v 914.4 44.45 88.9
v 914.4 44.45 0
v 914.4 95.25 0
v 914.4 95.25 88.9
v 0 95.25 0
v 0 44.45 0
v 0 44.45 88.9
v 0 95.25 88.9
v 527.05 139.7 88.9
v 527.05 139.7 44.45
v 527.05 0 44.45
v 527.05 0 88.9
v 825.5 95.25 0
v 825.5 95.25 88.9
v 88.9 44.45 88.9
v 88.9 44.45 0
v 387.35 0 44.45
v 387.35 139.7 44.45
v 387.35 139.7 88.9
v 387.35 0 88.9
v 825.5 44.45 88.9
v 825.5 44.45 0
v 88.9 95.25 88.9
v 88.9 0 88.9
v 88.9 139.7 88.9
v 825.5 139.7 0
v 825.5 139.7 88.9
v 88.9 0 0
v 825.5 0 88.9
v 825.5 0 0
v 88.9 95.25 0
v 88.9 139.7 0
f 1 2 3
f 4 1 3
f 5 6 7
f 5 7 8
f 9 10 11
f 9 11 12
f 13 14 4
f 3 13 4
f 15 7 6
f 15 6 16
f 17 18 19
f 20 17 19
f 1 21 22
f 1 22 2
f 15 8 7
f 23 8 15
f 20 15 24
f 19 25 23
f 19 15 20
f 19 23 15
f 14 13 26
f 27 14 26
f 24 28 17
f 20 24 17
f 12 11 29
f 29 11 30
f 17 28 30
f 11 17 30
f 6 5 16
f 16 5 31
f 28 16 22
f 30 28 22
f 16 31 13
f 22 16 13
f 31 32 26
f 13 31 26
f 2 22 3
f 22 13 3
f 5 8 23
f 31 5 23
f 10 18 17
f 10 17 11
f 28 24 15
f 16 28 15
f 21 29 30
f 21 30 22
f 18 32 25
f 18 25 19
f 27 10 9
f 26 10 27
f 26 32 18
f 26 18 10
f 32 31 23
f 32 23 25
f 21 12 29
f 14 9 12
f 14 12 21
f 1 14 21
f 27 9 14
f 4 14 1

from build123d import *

# Parameters (mm, degrees)
F0_W     = 914.4
F0_H     = 139.7
F1_DEPTH = 88.9
F2_W     = 88.9
F2_H     = 44.45
F3_DEPTH = 88.9
F4_W     = 139.7
F4_H     = 44.45
F5_DEPTH = 139.7


with BuildPart() as f1:
    # F0 (on Top) → F1 (new body)
    with BuildSketch(Plane.XY):
        with Locations((457.2, 69.85)):
            Rectangle(F0_W, F0_H)
    extrude(amount=F1_DEPTH)

    # F2 (on face) → F3 (cut, through all)
    with BuildSketch(Plane.XY.offset(88.9)):
        with Locations((44.45, 117.475)):
            Rectangle(F2_W, F2_H)
        with Locations((44.45, 22.225)):
            Rectangle(F2_W, F2_H)
        with Locations((869.95, 117.475)):
            Rectangle(F2_W, F2_H)
        with Locations((869.95, 22.225)):
            Rectangle(F2_W, F2_H)
    extrude(amount=-F3_DEPTH, mode=Mode.SUBTRACT)

    # F4 (on face) → F5 (cut, through all)
    with BuildSketch(Plane.XZ):
        with Locations((457.2, 66.675)):
            Rectangle(F4_W, F4_H)
    extrude(amount=-F5_DEPTH, mode=Mode.SUBTRACT)


solid = f1.part
